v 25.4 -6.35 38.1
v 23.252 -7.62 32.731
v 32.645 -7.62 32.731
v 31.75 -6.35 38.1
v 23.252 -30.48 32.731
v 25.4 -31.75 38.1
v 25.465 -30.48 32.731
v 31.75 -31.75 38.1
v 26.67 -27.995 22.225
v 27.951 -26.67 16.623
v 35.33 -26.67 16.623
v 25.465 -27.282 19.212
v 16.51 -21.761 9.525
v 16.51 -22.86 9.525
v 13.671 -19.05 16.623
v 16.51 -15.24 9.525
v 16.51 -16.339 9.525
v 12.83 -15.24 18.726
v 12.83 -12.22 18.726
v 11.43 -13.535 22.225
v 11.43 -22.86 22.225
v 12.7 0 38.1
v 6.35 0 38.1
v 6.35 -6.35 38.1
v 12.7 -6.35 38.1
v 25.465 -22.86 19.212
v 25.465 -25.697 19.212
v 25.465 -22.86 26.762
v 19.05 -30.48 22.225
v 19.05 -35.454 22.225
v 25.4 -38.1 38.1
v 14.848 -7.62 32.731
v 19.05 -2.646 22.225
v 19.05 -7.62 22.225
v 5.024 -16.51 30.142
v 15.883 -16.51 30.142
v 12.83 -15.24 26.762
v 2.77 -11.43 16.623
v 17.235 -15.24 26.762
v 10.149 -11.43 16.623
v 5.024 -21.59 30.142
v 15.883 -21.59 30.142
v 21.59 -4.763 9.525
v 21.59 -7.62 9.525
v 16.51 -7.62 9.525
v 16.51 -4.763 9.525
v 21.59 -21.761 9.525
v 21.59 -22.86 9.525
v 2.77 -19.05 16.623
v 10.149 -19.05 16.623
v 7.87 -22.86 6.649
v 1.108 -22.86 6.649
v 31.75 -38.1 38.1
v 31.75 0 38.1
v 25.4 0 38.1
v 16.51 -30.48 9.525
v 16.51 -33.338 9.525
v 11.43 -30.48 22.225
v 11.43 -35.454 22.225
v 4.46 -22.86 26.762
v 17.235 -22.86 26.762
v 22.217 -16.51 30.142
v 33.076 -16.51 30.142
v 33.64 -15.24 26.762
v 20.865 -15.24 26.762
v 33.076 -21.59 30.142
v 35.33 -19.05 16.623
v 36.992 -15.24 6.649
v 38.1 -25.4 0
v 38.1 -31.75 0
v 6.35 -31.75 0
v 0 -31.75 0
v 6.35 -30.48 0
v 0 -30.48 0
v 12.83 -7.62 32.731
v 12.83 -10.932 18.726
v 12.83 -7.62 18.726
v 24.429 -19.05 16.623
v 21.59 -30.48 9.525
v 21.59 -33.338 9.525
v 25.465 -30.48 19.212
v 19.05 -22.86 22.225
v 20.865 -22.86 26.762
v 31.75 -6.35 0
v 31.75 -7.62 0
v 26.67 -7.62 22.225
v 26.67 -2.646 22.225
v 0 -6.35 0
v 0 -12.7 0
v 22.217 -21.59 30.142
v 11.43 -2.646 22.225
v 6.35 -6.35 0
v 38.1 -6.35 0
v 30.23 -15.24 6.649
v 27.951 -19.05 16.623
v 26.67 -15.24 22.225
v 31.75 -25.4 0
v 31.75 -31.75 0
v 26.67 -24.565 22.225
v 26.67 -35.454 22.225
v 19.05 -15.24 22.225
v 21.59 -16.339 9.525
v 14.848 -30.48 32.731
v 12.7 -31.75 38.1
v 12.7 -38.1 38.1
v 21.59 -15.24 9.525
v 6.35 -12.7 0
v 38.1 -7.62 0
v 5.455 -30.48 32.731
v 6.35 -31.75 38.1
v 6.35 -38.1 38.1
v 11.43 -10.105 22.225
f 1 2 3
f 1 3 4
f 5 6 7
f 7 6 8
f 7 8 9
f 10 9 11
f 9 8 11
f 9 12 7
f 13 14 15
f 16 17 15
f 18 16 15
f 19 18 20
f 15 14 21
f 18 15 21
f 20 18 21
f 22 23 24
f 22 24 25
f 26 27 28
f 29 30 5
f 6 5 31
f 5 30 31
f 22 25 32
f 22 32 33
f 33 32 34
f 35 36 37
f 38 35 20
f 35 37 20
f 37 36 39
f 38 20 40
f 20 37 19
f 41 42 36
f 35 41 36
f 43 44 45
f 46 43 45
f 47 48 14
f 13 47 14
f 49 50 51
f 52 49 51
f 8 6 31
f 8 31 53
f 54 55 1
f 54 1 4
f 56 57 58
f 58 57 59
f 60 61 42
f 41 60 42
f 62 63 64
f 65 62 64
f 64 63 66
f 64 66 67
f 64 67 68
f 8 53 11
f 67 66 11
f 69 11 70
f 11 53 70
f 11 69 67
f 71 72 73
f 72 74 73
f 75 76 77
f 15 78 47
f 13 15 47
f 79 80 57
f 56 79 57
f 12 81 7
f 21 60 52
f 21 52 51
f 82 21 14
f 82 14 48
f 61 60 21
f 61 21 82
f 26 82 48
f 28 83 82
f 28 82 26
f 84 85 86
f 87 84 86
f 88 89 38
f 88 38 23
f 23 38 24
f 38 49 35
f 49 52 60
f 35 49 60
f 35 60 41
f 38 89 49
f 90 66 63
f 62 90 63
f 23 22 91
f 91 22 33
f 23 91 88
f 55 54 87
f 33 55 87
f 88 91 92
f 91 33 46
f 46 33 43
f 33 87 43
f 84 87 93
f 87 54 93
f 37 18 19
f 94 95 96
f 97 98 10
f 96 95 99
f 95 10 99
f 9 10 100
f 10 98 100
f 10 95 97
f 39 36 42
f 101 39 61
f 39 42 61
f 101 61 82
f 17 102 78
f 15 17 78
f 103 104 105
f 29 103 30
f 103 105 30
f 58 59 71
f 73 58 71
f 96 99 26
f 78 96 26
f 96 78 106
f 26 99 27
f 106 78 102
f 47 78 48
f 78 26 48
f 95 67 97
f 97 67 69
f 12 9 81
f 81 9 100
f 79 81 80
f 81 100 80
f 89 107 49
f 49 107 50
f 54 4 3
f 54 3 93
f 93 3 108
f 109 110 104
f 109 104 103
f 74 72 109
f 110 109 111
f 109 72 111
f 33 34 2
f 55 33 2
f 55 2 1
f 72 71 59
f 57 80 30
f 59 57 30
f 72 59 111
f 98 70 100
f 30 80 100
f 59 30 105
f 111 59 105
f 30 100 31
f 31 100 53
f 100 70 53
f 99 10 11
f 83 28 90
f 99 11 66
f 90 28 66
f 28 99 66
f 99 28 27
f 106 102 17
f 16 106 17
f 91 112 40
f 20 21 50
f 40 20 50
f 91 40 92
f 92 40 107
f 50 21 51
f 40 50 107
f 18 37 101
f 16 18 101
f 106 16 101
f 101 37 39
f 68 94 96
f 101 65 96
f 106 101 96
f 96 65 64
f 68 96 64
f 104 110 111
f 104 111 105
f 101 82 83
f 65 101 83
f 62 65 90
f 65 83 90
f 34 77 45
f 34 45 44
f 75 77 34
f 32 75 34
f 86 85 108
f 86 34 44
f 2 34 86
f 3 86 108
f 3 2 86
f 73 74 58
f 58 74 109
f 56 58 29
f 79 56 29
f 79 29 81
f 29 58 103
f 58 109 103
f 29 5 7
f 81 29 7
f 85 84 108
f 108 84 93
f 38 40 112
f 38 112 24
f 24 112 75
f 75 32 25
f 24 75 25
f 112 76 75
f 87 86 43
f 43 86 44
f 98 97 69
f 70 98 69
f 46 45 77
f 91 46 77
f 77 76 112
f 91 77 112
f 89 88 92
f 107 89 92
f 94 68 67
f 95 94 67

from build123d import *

# Parameters (mm, degrees)
F0_W      = 38.1
F0_H      = 38.1
F1_DEPTH  = 38.1
F6_DEPTH  = 38.1
F8_DEPTH  = 38.1
F9_W      = 25.270408
F9_H      = 7.62
F9_W_2    = 25.464796
F10_DEPTH = 38.1


with BuildPart() as f1:
    # F0 (on Front) → F1 (new body)
    with BuildSketch(Plane.XZ):
        with Locations((19.05, 19.05)):
            Rectangle(F0_W, F0_H)
    extrude(amount=F1_DEPTH)

    # F5 (on offset) → F6 (cut)
    with BuildSketch(Plane.YZ.offset(38.1)):
        Polygon((-31.75, 0), (-38.1, 38.1), (-38.1, 0), align=None)
        Polygon((-25.4, 0), (-12.7, 0), (-19.05, 16.622577), align=None)
        Polygon((-11.43, 16.622577), (-6.35, 38.1), (-31.75, 38.1), (-26.67, 16.622577), (-21.59, 30.142272), (-16.51, 30.142272), align=None)
        Polygon((-6.35, 0), (0, 0), (0, 38.1), align=None)
    extrude(amount=-F6_DEPTH, mode=Mode.SUBTRACT)

    # F7 (on offset) → F8 (cut)
    with BuildSketch(Plane.XZ.offset(38.1)):
        Polygon((0, 38.1), (0, 0), (6.35, 38.1), align=None)
        Polygon((25.4, 38.1), (12.7, 38.1), (19.05, 22.225), align=None)
        Polygon((11.43, 22.225), (6.35, 0), (31.75, 0), (26.67, 22.225), (21.59, 9.525), (16.51, 9.525), align=None)
        Polygon((31.75, 38.1), (38.1, 0), (38.1, 38.1), align=None)
    extrude(amount=-F8_DEPTH, mode=Mode.SUBTRACT)

    # F9 (on offset) → F10 (cut)
    with BuildSketch(Plane.XY.offset(38.1)):
        with Locations((25.464796, -11.43)):
            Rectangle(F9_W, F9_H)
        with Locations((12.732398, -26.67)):
            Rectangle(F9_W_2, F9_H)
    extrude(amount=-F10_DEPTH, mode=Mode.SUBTRACT)


solid = f1.part
